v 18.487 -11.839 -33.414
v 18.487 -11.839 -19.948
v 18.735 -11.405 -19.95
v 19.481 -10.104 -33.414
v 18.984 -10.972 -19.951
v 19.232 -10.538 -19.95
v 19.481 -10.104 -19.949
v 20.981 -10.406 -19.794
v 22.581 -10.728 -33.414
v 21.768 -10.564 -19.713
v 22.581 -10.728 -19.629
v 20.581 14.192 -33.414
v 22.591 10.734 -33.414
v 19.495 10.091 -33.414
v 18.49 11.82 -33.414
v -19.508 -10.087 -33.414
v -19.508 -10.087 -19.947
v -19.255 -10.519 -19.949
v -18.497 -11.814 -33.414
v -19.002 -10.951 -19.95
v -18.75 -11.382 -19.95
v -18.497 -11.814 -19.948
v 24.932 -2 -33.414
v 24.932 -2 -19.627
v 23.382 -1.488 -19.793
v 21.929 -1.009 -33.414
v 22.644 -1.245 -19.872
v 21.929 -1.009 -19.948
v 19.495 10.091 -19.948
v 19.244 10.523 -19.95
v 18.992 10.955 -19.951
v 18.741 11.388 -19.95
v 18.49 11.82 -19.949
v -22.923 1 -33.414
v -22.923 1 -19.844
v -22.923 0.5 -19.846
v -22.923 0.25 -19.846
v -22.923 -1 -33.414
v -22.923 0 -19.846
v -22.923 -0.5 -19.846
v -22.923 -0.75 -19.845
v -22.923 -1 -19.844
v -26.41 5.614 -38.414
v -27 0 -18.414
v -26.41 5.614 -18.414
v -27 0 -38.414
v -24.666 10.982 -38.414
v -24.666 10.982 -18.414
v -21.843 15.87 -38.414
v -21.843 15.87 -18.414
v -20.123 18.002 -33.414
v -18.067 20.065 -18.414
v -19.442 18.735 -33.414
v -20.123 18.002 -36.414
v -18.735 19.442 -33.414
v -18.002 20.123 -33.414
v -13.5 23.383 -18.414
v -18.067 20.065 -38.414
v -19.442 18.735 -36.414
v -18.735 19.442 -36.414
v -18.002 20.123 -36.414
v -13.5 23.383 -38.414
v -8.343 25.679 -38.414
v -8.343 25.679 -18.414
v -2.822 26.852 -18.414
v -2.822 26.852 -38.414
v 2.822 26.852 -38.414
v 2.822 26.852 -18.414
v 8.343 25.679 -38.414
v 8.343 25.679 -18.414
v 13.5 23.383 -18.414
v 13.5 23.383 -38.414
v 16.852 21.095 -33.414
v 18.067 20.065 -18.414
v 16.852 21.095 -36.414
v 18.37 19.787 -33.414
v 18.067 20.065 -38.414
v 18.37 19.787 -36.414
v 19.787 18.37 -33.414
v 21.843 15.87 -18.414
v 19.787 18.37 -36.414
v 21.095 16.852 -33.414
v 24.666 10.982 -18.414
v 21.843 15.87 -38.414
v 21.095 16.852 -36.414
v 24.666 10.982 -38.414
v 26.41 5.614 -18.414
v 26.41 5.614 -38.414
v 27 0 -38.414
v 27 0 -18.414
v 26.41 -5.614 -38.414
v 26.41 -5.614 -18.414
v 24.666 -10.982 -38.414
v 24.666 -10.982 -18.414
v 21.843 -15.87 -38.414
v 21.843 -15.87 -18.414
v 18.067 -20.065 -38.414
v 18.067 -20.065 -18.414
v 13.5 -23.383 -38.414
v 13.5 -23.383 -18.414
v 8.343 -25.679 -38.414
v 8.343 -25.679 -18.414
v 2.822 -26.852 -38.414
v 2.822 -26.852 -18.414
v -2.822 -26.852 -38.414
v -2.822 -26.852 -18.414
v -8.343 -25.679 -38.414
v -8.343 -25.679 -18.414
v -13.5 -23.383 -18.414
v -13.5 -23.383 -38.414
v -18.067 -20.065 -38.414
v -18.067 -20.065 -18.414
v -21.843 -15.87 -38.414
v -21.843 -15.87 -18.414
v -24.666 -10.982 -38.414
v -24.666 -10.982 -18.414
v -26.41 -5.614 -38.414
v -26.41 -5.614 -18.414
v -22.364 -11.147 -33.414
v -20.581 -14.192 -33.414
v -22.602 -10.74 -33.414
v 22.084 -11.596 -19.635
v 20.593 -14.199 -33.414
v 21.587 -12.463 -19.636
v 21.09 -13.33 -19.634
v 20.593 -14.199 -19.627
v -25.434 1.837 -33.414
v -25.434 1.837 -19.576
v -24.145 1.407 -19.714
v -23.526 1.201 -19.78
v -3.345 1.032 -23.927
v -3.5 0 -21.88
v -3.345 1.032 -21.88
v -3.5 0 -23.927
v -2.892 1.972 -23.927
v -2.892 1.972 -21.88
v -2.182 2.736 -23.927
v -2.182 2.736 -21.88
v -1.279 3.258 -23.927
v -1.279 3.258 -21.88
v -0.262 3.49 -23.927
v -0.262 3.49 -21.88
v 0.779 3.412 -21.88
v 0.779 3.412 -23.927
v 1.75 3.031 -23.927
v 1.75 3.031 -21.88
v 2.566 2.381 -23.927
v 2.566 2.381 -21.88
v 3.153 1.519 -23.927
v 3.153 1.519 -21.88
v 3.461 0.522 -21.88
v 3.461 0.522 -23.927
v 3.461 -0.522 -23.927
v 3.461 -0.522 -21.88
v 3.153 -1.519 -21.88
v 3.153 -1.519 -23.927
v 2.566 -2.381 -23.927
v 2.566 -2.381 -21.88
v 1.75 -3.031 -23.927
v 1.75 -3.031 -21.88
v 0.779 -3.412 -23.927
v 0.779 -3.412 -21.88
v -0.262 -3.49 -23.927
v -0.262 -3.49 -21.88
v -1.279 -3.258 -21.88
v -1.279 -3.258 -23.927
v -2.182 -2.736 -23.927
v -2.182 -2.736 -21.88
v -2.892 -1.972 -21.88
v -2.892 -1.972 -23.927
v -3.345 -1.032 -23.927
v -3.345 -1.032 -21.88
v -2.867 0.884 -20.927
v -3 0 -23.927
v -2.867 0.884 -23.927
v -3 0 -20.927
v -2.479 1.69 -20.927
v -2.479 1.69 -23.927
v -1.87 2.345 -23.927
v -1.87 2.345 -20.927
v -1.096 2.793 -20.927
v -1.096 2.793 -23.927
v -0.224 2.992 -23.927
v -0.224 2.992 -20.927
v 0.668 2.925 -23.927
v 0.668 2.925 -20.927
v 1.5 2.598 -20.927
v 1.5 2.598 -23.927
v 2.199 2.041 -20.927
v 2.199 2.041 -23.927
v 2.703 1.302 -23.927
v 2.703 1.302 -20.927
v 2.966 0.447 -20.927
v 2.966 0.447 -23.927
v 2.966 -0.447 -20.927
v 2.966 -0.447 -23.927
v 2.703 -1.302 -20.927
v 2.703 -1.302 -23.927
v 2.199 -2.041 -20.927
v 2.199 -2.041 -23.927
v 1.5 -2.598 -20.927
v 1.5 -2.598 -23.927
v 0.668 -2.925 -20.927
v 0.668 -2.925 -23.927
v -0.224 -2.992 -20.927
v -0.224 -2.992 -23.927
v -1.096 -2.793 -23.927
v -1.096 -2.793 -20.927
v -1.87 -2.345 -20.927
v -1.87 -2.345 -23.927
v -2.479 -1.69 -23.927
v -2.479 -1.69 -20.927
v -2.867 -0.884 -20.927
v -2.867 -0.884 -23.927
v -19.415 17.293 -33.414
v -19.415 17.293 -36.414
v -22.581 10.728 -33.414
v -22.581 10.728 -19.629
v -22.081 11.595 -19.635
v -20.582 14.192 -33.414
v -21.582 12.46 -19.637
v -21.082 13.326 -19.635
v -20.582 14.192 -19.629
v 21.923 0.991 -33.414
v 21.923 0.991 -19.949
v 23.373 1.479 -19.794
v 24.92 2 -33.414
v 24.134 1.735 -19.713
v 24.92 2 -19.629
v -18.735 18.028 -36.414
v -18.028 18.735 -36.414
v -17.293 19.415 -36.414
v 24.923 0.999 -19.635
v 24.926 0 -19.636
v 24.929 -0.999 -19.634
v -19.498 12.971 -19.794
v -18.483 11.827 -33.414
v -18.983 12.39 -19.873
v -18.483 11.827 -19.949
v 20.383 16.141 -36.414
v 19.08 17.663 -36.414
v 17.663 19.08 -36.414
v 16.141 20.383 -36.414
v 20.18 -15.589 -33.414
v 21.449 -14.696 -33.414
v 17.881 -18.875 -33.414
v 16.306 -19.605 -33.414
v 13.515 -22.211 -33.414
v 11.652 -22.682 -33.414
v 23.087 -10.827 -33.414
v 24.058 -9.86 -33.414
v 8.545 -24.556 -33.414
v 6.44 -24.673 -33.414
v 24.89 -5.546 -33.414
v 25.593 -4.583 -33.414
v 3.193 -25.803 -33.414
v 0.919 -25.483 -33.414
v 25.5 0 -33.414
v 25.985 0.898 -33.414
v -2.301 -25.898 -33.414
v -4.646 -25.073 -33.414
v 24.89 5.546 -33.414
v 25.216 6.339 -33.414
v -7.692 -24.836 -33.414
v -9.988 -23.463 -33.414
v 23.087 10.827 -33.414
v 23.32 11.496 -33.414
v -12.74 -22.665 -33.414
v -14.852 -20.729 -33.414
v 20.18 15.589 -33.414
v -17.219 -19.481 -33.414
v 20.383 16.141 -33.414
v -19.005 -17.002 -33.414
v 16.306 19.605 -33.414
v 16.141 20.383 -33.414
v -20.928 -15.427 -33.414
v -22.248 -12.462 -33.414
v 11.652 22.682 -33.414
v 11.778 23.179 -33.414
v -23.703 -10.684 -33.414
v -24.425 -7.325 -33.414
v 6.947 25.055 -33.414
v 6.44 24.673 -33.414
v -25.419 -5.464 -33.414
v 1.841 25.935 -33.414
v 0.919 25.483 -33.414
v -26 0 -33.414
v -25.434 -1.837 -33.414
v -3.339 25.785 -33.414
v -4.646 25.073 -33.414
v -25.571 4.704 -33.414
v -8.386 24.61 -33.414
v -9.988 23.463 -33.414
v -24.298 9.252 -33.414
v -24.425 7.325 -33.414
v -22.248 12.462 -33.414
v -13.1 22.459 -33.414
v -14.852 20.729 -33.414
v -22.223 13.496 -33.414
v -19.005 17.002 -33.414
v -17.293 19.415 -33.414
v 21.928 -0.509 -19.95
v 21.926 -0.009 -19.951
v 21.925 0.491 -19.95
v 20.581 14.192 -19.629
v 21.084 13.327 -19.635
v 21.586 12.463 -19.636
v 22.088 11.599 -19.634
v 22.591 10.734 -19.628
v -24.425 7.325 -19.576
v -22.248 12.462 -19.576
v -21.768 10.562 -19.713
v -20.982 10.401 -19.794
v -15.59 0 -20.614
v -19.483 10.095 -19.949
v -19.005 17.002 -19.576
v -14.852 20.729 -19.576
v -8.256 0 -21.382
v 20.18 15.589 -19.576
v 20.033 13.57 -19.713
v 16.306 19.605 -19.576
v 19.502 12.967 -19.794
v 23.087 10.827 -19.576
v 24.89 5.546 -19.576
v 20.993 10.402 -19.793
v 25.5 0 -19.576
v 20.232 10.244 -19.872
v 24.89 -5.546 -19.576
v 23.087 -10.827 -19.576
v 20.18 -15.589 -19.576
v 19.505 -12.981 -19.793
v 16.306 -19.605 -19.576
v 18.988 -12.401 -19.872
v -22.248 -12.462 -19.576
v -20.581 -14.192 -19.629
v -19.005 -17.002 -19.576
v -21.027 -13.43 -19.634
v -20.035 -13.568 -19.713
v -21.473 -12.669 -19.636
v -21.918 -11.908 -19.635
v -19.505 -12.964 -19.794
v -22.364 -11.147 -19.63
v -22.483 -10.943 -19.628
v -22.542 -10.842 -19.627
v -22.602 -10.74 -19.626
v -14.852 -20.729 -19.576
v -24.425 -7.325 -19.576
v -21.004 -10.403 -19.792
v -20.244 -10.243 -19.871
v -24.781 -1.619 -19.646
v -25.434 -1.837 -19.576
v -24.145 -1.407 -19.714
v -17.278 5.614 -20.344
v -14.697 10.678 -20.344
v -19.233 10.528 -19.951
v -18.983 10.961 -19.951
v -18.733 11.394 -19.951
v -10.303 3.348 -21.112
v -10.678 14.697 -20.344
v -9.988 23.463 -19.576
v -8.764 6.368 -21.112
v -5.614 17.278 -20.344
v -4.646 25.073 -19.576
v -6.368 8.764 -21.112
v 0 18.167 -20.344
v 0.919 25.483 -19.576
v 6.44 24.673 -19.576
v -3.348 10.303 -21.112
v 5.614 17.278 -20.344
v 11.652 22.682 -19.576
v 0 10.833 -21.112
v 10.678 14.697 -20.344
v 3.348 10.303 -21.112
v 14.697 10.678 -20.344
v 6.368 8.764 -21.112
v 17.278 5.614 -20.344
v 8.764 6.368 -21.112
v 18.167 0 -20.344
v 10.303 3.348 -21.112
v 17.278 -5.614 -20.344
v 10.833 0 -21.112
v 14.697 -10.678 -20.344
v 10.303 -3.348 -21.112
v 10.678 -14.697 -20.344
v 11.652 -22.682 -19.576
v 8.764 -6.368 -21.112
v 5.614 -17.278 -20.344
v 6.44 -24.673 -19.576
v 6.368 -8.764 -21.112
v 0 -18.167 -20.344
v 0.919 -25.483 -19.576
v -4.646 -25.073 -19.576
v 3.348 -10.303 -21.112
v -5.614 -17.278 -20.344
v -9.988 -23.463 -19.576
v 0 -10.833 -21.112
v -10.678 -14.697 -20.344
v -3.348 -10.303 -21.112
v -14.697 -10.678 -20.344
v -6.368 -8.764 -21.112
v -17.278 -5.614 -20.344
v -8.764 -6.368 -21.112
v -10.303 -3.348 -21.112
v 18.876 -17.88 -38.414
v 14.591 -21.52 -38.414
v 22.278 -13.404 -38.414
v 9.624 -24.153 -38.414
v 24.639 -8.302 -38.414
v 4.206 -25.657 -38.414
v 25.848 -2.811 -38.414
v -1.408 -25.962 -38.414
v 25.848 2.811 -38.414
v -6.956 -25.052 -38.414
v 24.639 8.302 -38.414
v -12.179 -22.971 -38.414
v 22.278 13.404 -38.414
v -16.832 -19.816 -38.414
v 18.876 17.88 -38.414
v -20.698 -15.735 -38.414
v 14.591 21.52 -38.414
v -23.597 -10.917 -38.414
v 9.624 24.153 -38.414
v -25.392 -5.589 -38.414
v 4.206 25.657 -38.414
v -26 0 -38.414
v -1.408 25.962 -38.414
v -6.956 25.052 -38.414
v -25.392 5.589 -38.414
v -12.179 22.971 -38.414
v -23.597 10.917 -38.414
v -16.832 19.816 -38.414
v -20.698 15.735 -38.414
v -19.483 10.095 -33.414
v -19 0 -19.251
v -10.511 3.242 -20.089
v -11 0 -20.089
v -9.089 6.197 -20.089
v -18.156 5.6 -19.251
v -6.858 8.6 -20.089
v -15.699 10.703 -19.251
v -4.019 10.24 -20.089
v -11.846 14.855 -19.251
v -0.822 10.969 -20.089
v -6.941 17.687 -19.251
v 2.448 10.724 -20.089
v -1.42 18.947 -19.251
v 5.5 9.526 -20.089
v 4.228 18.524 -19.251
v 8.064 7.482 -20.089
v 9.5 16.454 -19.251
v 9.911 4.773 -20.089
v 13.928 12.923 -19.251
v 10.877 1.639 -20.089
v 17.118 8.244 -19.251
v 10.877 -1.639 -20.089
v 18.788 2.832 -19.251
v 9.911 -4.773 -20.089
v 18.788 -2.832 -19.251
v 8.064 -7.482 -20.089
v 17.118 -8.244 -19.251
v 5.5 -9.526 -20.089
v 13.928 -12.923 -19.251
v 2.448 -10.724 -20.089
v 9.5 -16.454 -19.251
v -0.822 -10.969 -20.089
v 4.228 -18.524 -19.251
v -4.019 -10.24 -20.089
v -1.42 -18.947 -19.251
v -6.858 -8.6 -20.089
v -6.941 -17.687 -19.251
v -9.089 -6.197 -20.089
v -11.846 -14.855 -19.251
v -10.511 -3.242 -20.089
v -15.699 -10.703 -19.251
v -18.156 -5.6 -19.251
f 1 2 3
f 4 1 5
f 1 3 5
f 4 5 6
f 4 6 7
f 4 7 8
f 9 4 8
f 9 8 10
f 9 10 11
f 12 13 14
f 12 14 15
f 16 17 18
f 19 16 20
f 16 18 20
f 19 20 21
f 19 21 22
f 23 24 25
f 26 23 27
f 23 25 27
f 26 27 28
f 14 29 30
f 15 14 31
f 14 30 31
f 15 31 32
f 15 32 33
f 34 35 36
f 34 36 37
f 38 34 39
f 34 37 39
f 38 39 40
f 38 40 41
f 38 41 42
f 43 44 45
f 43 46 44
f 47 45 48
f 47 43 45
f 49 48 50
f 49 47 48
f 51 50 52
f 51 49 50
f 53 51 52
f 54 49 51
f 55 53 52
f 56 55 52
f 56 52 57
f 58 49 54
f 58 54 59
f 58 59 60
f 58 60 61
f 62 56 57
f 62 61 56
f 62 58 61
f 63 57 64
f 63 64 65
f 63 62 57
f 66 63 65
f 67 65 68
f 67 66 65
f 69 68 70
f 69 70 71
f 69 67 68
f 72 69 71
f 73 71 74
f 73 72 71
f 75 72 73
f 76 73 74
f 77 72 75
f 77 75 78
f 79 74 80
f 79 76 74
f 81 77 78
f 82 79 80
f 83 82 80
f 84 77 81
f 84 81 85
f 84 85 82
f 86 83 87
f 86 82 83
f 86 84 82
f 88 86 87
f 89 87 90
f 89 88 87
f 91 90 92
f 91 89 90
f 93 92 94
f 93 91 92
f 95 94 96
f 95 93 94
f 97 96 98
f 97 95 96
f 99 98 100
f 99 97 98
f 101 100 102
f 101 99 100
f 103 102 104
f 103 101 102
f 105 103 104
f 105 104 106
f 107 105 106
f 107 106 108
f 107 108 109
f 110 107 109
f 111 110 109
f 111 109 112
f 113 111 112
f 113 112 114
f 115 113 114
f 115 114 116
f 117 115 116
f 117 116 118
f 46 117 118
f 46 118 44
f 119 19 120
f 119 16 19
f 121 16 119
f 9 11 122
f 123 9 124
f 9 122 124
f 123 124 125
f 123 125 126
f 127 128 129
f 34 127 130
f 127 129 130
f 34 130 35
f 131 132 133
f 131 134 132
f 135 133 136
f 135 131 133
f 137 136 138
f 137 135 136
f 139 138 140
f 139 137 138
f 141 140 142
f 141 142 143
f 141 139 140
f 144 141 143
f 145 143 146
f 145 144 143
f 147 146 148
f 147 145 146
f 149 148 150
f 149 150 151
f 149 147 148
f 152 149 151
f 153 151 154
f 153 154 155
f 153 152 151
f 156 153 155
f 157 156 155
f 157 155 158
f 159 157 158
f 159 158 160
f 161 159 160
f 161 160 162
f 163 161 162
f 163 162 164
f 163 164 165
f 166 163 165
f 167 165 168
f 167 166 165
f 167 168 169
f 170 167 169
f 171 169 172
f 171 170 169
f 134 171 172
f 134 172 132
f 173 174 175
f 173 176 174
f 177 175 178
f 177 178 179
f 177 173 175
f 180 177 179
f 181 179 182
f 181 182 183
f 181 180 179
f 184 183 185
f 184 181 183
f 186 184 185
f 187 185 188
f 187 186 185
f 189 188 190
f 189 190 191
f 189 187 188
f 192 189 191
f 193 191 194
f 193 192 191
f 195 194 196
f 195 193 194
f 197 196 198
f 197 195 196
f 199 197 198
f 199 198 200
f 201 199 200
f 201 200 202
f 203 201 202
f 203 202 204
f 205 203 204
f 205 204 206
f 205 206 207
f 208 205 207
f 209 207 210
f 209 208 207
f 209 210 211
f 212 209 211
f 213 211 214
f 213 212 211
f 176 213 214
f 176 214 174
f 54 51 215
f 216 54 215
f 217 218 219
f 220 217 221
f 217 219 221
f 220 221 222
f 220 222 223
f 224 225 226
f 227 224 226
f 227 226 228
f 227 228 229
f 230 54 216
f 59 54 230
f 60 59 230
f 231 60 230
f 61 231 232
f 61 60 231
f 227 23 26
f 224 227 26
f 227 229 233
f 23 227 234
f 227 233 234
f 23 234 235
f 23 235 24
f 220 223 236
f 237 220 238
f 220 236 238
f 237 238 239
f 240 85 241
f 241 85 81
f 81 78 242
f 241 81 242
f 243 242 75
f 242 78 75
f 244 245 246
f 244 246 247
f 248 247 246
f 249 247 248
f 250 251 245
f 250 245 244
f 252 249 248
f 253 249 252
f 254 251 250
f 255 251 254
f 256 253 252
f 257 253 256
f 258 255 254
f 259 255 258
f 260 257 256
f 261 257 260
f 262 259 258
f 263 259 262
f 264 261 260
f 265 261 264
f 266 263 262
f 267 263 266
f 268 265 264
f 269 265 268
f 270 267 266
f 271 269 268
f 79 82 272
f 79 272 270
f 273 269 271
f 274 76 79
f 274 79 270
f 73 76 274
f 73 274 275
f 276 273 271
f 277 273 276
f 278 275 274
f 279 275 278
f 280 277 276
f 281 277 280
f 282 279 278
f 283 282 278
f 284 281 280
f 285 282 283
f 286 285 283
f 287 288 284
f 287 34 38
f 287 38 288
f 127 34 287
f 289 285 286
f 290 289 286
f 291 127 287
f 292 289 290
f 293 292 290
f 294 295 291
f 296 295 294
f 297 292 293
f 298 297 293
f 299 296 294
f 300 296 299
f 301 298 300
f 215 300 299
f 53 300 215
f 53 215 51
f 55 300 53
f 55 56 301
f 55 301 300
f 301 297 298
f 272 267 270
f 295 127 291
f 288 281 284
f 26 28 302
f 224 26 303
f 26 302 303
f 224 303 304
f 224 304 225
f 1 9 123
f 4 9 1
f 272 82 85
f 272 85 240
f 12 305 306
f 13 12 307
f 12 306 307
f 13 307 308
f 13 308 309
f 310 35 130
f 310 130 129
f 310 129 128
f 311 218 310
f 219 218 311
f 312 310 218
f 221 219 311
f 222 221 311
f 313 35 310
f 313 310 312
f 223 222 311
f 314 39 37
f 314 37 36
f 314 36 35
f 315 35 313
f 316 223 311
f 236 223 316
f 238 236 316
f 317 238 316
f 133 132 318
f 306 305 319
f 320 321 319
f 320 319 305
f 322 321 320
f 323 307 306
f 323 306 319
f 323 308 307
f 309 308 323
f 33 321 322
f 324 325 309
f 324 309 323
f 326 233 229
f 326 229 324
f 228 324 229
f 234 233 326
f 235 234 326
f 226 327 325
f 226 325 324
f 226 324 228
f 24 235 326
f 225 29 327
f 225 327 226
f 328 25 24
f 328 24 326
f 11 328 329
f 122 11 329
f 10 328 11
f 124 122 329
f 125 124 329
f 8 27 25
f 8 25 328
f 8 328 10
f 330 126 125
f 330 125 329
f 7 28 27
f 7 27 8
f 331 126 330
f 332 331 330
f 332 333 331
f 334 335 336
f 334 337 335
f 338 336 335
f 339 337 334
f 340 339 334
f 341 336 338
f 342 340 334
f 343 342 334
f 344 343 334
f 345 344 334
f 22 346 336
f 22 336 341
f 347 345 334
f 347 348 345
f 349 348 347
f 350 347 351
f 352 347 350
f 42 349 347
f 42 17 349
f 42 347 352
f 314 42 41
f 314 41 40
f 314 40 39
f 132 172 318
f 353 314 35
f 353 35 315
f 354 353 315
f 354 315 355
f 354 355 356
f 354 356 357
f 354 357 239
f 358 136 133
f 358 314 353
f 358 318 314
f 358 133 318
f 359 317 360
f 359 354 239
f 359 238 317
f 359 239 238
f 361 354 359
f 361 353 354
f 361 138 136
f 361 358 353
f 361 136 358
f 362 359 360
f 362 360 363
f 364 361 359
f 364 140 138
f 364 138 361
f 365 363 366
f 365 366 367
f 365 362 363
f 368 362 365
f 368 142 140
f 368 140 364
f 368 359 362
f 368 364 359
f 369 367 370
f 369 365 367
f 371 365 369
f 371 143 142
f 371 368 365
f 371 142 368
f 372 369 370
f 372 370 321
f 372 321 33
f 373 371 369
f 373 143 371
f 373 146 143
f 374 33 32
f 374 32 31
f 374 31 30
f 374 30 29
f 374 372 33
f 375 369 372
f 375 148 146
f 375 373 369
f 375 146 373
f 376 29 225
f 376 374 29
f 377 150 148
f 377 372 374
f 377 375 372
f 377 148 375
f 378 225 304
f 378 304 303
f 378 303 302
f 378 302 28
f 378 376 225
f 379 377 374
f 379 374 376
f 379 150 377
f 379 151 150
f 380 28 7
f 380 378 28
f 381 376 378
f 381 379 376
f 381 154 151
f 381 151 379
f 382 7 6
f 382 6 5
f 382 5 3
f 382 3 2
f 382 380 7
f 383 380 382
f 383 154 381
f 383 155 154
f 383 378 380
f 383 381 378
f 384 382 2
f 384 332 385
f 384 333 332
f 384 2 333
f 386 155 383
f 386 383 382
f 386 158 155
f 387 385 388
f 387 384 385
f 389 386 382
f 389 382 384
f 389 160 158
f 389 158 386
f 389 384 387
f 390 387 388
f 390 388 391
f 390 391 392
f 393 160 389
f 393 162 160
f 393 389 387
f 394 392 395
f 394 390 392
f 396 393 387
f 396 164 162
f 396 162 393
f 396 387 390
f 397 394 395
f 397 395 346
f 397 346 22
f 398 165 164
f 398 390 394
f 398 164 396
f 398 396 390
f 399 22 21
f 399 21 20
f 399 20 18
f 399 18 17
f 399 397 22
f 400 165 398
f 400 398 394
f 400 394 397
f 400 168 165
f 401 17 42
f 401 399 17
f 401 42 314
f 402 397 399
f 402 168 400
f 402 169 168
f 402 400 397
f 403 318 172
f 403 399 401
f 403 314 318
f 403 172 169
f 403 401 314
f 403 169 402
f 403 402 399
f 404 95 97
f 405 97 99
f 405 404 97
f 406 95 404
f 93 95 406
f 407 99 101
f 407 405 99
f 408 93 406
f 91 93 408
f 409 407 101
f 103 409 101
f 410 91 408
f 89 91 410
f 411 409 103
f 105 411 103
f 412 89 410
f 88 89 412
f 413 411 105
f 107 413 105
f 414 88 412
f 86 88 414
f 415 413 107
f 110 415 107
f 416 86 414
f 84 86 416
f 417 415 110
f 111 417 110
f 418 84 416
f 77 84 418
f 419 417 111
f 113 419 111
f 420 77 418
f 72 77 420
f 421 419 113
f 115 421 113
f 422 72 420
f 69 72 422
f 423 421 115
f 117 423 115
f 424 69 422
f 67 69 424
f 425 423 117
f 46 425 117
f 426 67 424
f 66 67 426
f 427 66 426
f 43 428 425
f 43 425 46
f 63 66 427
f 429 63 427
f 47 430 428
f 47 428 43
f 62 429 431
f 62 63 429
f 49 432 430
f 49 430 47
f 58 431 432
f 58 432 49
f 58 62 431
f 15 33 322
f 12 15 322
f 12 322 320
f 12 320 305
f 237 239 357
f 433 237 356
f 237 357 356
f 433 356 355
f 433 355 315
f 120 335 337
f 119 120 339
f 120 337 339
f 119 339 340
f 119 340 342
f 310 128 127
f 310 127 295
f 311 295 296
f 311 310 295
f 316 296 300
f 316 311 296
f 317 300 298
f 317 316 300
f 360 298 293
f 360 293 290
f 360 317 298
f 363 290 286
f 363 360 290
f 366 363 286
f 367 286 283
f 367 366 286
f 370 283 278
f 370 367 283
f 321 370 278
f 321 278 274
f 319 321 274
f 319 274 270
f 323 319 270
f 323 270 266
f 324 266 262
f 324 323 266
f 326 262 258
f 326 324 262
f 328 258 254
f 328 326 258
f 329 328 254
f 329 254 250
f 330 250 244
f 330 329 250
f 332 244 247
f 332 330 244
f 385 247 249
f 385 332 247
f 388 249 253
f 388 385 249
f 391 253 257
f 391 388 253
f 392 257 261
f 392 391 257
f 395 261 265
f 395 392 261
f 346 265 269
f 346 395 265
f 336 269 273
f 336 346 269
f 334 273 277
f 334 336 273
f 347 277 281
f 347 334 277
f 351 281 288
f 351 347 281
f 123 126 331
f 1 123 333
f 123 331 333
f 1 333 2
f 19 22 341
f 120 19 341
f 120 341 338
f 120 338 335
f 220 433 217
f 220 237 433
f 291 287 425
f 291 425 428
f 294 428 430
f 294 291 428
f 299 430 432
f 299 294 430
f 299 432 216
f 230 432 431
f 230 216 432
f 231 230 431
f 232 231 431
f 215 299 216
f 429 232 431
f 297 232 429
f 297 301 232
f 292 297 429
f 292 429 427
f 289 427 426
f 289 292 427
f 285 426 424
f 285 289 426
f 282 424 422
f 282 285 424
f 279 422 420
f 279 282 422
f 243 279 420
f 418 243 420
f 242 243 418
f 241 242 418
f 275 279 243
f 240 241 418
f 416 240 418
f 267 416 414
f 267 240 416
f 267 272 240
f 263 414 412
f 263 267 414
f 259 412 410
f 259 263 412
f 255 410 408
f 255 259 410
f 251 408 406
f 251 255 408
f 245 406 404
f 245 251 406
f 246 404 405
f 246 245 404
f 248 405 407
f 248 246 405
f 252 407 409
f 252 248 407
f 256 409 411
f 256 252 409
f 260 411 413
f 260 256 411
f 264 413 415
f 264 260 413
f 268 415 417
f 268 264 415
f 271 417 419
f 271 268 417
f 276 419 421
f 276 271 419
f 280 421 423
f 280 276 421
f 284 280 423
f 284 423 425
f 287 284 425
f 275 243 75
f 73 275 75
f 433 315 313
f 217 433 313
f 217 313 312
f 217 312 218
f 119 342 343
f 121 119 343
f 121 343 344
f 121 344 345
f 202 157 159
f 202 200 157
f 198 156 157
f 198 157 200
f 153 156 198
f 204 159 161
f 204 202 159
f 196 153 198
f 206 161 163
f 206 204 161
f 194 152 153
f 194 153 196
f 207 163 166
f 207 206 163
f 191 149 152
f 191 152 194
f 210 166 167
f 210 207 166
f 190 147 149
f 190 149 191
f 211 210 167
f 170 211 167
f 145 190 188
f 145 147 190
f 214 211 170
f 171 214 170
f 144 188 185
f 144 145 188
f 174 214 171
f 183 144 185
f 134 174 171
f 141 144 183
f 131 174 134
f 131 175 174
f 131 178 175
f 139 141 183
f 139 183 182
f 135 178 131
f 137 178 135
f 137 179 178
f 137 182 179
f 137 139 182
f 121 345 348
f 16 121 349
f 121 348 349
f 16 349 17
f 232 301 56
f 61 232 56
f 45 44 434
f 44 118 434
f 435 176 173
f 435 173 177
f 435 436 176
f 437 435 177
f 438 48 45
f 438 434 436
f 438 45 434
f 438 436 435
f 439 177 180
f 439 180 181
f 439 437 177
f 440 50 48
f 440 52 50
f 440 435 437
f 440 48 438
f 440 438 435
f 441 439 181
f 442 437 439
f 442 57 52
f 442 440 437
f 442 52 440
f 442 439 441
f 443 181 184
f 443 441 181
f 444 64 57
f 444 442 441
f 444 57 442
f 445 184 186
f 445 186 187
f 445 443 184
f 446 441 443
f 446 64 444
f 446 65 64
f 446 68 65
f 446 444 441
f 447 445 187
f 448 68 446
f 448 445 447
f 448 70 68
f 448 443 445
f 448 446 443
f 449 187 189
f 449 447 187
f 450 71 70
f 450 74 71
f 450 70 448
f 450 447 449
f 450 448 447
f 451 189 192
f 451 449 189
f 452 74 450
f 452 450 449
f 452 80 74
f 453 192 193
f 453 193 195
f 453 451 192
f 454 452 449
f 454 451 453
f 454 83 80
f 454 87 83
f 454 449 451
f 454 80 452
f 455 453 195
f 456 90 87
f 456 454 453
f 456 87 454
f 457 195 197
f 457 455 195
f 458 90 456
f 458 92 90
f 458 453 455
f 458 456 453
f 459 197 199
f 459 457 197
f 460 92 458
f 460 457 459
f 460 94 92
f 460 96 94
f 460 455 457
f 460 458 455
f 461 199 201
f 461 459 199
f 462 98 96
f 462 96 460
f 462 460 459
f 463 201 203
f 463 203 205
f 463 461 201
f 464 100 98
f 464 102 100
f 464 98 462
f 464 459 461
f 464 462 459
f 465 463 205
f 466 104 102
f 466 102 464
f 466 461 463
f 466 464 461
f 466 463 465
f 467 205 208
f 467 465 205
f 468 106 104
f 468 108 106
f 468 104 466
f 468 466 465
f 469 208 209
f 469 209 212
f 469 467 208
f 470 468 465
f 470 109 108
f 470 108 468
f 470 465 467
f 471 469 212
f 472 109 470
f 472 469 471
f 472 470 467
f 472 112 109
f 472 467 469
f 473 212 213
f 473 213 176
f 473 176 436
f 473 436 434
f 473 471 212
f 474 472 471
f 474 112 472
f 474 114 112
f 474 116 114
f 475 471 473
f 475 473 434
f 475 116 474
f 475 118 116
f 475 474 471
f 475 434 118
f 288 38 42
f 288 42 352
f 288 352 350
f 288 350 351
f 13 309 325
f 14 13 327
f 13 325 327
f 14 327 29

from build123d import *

# Parameters (mm, degrees)
BOSS_EXTRU_4_START      = -13.837467
BOSS_EXTRU_4_DEPTH      = 13.837467
ENL_V_MAT_EXTRU_2_DEPTH = 3
ENL_V_MAT_EXTRU_3_DEPTH = 3


with BuildPart() as part:
    # Esquisse3 → Révolution1 (revolve)
    with BuildSketch(Plane(origin=(0, 0, 0), x_dir=(1, 0, 0), z_dir=(0, 1, 0))):
        Polygon((-27, 18.413817), (-27, 38.413817), (-26, 38.413817), (-26, 33.413817), (-25.5, 33.413817), (-25.5, 19.57635), (-3.5, 21.879977), (-3.5, 23.926865), (-3, 23.926865), (-3, 20.926865), align=None)
    revolve(axis=Axis((0, 0, 0), (0, 0, -1)))

    # Esquisse7 → Boss.-Extru.4 (add)
    with BuildSketch(Plane(origin=(0, 0, -33.413817), x_dir=(-1, 0, 0), z_dir=(0, 0, -1)).offset(BOSS_EXTRU_4_START)):
        Polygon((22.922963, -1), (25.922963, -2), (25.922963, 2), (22.922963, 1), align=None)
        Polygon((-21.922971, 0.990749), (-24.919872, 2), (-24.932213, -1.999981), (-21.929142, -1.009241), align=None)
        Polygon((19.48304, 10.094527), (22.581242, 10.727885), (20.581931, 14.192384), (18.483384, 11.826776), align=None)
        Polygon((-18.489986, 11.81993), (-20.581242, 14.191987), (-22.591207, 10.733658), (-19.494969, 10.090766), align=None)
        Polygon((18.497253, -11.813544), (20.581242, -14.191987), (22.363748, -11.146506), (22.601778, -10.739823), (19.507521, -10.087462), align=None)
        Polygon((-19.481096, -10.10411), (-22.581242, -10.727885), (-20.592654, -14.19855), (-18.486802, -11.839443), align=None)
    extrude(amount=BOSS_EXTRU_4_DEPTH)

    # Esquisse8 → Enlèv. mat.-Extru.2 (cut)
    with BuildSketch(Plane(origin=(0, 0, -33.413817), x_dir=(-1, 0, 0), z_dir=(0, 0, -1))):
        Polygon((10.264649, 12.385969), (23.674383, 25.795703), (25.795703, 23.674383), (12.385969, 10.264649), align=None)
    extrude(amount=ENL_V_MAT_EXTRU_2_DEPTH, mode=Mode.SUBTRACT)

    # Esquisse9 → Enlèv. mat.-Extru.3 (cut)
    with BuildSketch(Plane(origin=(0, 0, -33.413817), x_dir=(-1, 0, 0), z_dir=(0, 0, -1))):
        Polygon((-12.020815, 16.263456), (-19.091883, 23.334524), (-23.334524, 19.091883), (-16.263456, 12.020815), align=None)
    extrude(amount=ENL_V_MAT_EXTRU_3_DEPTH, mode=Mode.SUBTRACT)


solid = part.part
